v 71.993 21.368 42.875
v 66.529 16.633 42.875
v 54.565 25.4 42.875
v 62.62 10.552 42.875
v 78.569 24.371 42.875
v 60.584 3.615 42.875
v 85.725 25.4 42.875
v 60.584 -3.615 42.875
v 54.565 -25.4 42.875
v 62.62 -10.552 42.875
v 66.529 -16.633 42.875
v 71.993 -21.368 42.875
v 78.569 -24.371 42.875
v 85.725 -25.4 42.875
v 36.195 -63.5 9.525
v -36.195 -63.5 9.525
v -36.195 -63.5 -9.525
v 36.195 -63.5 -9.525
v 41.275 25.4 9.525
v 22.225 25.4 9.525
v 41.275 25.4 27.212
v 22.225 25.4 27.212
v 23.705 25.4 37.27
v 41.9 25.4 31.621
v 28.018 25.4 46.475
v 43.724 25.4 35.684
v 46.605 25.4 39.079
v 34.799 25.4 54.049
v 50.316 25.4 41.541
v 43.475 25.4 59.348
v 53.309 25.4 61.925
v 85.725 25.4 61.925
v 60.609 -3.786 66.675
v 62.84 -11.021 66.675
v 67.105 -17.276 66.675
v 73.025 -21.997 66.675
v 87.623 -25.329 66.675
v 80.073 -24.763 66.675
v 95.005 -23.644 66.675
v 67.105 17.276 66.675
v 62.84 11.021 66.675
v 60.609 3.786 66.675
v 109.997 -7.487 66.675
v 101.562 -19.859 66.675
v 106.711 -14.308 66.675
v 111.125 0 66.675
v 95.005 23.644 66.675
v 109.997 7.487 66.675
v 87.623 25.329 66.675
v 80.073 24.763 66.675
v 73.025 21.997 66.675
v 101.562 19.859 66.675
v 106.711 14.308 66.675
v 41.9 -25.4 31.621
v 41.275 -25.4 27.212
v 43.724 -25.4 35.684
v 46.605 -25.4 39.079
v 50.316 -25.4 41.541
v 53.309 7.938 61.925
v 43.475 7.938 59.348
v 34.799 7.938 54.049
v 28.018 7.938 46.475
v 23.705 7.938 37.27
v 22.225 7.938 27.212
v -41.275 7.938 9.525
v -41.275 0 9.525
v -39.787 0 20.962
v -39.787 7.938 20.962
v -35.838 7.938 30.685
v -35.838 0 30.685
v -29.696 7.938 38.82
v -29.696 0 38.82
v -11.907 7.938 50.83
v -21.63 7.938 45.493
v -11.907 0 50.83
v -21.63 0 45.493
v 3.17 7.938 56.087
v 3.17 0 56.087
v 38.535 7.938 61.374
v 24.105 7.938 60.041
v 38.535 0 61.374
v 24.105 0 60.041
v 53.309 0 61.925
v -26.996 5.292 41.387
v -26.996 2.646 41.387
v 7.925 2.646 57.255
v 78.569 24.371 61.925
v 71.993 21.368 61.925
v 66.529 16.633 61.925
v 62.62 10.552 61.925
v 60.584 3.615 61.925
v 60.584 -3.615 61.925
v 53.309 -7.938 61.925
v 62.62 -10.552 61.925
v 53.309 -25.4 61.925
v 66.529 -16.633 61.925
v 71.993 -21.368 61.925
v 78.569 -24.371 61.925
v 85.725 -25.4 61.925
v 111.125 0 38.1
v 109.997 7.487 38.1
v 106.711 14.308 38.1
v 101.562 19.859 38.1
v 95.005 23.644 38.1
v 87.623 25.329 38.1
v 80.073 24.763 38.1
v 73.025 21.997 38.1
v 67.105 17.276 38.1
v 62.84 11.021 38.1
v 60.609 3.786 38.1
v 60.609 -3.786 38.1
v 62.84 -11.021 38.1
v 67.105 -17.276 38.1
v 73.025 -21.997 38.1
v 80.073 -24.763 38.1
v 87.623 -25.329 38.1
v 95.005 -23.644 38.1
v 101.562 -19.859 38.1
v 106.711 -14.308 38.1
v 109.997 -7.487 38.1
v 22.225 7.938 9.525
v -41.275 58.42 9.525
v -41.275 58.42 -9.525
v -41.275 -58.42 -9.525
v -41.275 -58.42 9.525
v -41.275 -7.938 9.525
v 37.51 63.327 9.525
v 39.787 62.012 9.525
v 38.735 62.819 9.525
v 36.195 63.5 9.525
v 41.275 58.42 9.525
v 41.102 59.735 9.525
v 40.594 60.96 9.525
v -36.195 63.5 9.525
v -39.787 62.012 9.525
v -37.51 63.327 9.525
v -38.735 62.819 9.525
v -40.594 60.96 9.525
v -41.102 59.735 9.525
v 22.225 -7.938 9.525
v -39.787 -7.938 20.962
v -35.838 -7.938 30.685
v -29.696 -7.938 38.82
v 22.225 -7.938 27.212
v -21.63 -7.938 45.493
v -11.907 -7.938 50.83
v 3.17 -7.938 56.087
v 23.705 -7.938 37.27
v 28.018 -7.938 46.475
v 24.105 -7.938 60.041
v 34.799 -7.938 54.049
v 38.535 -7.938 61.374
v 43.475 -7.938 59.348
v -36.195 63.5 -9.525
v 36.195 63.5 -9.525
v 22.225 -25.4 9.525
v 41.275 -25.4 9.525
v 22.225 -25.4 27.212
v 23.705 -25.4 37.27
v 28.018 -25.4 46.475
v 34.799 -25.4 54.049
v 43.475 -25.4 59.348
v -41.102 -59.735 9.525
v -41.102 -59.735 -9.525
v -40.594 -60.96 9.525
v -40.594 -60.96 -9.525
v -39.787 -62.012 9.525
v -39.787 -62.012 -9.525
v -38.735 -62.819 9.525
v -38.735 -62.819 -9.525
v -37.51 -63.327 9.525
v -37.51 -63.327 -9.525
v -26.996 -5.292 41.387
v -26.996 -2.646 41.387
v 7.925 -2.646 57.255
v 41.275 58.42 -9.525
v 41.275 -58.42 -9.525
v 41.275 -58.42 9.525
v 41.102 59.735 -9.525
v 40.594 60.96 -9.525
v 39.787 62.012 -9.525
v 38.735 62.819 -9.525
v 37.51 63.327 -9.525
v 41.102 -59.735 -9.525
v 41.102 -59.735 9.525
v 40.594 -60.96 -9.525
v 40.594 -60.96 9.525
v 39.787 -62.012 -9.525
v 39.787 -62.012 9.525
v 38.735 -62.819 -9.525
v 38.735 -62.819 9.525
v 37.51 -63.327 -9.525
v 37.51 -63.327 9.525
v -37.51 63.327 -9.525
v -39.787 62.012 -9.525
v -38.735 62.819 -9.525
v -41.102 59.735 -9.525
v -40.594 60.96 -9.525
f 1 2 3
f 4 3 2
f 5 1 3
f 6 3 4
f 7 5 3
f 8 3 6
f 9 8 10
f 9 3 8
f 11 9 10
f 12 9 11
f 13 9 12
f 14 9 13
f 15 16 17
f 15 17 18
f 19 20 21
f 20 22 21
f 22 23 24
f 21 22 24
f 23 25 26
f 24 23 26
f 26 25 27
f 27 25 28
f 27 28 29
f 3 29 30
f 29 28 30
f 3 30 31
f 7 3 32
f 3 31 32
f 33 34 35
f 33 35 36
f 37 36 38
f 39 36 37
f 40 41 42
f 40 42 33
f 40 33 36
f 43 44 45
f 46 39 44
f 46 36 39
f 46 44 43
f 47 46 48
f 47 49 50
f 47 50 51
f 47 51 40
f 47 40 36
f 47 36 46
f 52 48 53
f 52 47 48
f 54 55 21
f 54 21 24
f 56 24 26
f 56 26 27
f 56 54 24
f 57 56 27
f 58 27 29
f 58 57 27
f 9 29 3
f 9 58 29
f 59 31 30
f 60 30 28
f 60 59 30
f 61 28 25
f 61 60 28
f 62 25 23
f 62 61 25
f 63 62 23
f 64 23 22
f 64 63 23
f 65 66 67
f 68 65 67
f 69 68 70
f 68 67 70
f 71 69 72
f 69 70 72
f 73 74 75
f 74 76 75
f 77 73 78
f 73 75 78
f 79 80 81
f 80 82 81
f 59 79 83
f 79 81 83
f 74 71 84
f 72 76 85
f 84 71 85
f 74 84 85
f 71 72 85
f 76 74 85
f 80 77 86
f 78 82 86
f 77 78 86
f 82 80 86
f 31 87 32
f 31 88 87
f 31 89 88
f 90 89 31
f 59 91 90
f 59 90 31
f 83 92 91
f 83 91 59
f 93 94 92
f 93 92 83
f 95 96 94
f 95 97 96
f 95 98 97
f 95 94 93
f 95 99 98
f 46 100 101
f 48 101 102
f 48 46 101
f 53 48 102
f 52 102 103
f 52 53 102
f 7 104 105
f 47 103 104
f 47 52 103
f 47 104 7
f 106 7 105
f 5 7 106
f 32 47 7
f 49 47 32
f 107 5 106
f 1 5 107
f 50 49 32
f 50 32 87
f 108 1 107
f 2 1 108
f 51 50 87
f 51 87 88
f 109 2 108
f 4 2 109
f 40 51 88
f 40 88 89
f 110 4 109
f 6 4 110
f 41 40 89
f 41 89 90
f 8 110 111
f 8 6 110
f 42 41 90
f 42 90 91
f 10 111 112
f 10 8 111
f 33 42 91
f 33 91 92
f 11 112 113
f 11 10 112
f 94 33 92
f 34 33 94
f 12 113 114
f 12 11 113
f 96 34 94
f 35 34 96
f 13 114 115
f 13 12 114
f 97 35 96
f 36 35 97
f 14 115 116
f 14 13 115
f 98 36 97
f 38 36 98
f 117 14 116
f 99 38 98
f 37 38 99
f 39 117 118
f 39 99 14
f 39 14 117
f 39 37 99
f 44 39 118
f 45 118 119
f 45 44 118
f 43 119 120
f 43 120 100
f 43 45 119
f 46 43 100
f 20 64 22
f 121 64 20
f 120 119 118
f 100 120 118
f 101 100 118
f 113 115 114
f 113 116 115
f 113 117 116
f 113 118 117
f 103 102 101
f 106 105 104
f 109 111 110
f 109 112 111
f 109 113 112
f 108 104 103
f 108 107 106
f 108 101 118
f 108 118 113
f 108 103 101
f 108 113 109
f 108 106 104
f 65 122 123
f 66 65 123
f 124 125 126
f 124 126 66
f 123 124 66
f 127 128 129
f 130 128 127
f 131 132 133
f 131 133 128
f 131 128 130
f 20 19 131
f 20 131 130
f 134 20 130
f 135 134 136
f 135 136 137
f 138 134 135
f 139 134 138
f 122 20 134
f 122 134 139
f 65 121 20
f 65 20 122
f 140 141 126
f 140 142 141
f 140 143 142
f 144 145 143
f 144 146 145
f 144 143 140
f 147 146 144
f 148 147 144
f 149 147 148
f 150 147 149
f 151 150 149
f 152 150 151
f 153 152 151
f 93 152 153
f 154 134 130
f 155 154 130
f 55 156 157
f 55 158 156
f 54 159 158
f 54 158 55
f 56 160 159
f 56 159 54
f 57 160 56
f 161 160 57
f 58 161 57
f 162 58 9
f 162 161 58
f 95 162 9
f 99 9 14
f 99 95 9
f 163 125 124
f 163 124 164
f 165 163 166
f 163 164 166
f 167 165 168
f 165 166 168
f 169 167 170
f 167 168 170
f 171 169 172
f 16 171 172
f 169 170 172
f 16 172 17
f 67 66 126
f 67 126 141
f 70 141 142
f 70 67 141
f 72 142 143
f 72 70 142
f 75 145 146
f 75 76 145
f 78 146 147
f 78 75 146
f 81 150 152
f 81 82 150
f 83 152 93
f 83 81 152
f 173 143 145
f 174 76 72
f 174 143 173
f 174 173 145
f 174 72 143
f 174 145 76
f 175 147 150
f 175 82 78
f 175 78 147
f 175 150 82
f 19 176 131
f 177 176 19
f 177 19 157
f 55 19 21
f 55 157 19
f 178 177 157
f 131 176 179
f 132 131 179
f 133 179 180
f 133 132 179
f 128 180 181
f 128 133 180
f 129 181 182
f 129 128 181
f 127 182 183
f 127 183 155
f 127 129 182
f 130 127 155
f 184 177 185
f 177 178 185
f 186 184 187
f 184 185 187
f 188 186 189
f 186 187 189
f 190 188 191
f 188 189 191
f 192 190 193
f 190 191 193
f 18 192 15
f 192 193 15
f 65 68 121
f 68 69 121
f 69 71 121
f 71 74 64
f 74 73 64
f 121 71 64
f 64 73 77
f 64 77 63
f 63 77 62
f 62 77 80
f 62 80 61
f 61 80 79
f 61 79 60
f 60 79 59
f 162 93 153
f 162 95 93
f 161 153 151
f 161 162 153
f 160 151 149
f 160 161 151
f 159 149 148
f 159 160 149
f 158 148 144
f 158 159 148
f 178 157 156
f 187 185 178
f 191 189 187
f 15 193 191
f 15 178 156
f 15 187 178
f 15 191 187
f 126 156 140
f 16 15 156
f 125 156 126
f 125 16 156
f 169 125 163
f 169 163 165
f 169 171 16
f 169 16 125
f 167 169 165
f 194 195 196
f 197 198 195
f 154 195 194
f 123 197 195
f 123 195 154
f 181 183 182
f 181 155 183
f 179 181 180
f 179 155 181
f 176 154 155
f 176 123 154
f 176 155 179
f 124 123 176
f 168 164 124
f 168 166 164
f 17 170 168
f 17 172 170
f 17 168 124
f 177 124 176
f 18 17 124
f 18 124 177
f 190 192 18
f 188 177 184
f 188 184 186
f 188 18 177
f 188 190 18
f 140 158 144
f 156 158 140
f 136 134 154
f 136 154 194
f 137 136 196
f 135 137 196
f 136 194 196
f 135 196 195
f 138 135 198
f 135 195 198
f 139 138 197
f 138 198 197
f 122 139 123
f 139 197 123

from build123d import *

# Parameters (mm, degrees)
F1_DEPTH = 63.5
F0_W     = 25.4
F0_H     = 19.05
F2_DEPTH = 25.4
F3_DEPTH = 7.9375
F5_R     = 5.08
F6_R     = 5.08
F7_R     = 5.08
F8_R     = 5.08


with BuildPart() as f1:
    # F0 (on Front) → F1 (new body, symmetric)
    with BuildSketch(Plane.XZ):
        Polygon((41.275, -9.525), (41.275, 9.525), (22.225, 9.525), (-41.275, 9.525), (-41.275, -9.525), align=None)
    extrude(amount=F1_DEPTH, both=True)

    # F0 (on Front) → F2 (join, symmetric)
    with BuildSketch(Plane.XZ):
        with BuildLine():
            Line((22.225, 9.525), (41.275, 9.525))
            Line((41.275, 9.525), (41.275, 27.2120934423))
            ThreePointArc((41.275, 27.2120934423), (45.0451659726, 37.4828586606), (54.5649046512, 42.8752))
            Line((54.5649046512, 42.8752), (60.325, 42.8752))
            Line((60.325, 42.8752), (60.325, 61.9252))
            Line((60.325, 61.9252), (53.3086645403, 61.9252))
            ThreePointArc((53.3086645403, 61.9252), (31.1316001075, 50.5101296693), (22.225, 27.2120934423))
            Line((22.225, 27.2120934423), (22.225, 9.525))
        make_face()
        with Locations((73.025, 52.4002)):
            Rectangle(F0_W, F0_H)
    extrude(amount=F2_DEPTH, both=True)

    # F0 (on Front) → F3 (join, symmetric)
    with BuildSketch(Plane.XZ):
        with BuildLine():
            Line((-41.275, 9.525), (22.225, 9.525))
            Line((22.225, 9.525), (22.225, 27.2120934423))
            ThreePointArc((22.225, 27.2120934423), (31.1316001075, 50.5101296693), (53.3086645403, 61.9252))
            add(Edge.make_bspline(
                [(-41.275, 9.525), (-40.7104454935, 50.98317191), (6.0875406489, 61.2558983266), (53.3086645403, 61.9252)],
                knots=[0, 0, 0, 0, 108.1288608925, 108.1288608925, 108.1288608925, 108.1288608925], degree=3))
        make_face()
    extrude(amount=F3_DEPTH, both=True)

    # F0 (on Front) → F4 (revolve)
    with BuildSketch(Plane.XZ):
        Polygon((85.725, 61.9252), (85.725, 42.8752), (85.725, 38.1), (111.125, 38.1), (111.125, 66.675), (85.725, 66.675), align=None)
    revolve(axis=Axis((85.725, 0, 52.3875), (0, 0, 1)))

    # F5
    f5_edges = [f1.edges().sort_by_distance(p)[0] for p in [
        (41.275, -63.5, 0),
    ]]
    fillet(f5_edges, radius=F5_R)

    # F6
    f6_edges = [f1.edges().sort_by_distance(p)[0] for p in [
        (41.275, 63.5, 0),
    ]]
    fillet(f6_edges, radius=F6_R)

    # F7
    f7_edges = [f1.edges().sort_by_distance(p)[0] for p in [
        (-41.275, 63.5, 0),
    ]]
    fillet(f7_edges, radius=F7_R)

    # F8
    f8_edges = [f1.edges().sort_by_distance(p)[0] for p in [
        (-41.275, -63.5, 0),
    ]]
    fillet(f8_edges, radius=F8_R)


solid = f1.part
